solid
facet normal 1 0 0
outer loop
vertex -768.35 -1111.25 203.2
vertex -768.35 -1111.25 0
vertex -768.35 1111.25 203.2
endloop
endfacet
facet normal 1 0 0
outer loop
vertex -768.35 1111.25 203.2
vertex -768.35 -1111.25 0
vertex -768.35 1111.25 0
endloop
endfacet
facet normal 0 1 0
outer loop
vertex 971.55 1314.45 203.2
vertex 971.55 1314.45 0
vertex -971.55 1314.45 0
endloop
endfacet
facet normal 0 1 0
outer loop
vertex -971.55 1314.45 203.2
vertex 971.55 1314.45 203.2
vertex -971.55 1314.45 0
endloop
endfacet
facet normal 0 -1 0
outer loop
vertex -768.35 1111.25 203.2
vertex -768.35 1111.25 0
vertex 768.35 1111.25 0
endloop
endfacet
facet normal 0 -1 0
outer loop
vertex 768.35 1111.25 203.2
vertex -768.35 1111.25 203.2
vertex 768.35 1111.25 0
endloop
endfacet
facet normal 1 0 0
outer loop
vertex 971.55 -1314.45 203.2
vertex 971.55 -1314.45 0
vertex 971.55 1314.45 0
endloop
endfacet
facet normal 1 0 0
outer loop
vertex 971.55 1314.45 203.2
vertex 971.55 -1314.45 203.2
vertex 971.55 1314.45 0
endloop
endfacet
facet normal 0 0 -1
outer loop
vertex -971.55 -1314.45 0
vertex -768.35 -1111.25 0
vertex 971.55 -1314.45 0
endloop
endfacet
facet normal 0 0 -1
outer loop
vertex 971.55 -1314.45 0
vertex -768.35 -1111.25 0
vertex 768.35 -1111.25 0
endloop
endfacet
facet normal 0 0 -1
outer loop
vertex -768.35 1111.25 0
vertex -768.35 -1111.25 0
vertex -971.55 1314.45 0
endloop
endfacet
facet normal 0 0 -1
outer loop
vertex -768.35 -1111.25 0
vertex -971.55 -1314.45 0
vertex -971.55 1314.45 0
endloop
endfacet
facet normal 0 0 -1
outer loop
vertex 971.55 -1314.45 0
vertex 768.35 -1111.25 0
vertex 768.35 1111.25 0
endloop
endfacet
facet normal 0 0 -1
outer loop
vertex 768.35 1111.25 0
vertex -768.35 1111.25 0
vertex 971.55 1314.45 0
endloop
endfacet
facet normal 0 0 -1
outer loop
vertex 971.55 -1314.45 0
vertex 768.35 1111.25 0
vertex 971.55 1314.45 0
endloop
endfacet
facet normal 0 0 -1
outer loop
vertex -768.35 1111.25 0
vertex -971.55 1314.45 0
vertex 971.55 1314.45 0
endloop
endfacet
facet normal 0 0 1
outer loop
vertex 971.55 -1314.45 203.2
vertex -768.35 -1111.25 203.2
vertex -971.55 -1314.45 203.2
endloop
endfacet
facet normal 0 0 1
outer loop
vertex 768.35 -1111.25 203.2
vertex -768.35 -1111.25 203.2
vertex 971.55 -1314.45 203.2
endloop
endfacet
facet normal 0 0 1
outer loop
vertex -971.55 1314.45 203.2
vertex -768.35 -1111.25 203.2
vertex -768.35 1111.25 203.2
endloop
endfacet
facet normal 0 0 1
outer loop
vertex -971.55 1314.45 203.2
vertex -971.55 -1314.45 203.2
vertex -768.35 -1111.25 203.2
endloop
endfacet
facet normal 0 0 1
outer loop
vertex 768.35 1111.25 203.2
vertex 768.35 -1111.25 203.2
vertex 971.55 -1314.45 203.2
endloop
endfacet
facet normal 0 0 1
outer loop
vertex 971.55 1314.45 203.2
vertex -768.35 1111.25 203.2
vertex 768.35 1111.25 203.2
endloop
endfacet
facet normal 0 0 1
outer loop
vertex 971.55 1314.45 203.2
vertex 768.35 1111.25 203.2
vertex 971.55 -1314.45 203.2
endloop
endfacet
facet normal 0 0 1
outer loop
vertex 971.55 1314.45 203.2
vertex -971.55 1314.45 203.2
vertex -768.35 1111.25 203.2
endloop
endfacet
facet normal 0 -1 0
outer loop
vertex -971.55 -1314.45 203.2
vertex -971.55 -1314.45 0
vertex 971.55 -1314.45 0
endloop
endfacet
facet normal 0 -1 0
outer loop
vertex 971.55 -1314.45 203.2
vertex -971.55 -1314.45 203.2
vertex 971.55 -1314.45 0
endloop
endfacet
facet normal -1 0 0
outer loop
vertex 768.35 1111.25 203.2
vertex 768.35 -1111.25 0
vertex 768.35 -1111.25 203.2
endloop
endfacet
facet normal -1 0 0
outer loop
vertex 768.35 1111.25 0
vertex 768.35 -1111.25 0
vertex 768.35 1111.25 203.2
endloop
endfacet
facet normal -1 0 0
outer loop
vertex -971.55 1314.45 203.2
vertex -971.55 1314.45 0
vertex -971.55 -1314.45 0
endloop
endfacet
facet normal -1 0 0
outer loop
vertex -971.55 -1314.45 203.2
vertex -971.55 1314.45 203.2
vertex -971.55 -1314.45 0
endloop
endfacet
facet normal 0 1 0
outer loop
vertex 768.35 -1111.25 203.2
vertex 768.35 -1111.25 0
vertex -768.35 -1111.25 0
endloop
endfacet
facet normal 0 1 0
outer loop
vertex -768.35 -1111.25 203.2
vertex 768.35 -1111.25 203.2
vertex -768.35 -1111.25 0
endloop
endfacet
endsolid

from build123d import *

# Parameters (mm, degrees)
F0_W     = 203.2
F0_H     = 2222.5
F1_DEPTH = 203.2


with BuildPart() as f1:
    # F0 (on Top) → F1 (new body)
    with BuildSketch(Plane.XY):
        Polygon((971.55, 1111.25), (971.55, 1314.45), (-971.55, 1314.45), (-971.55, 1111.25), (-768.35, 1111.25), (768.35, 1111.25), align=None)
        with Locations((869.95, 0)):
            Rectangle(F0_W, F0_H)
        Polygon((971.55, -1314.45), (971.55, -1111.25), (768.35, -1111.25), (-768.35, -1111.25), (-971.55, -1111.25), (-971.55, -1314.45), align=None)
        with Locations((-869.95, 0)):
            Rectangle(F0_W, F0_H)
    extrude(amount=F1_DEPTH)


solid = f1.part
